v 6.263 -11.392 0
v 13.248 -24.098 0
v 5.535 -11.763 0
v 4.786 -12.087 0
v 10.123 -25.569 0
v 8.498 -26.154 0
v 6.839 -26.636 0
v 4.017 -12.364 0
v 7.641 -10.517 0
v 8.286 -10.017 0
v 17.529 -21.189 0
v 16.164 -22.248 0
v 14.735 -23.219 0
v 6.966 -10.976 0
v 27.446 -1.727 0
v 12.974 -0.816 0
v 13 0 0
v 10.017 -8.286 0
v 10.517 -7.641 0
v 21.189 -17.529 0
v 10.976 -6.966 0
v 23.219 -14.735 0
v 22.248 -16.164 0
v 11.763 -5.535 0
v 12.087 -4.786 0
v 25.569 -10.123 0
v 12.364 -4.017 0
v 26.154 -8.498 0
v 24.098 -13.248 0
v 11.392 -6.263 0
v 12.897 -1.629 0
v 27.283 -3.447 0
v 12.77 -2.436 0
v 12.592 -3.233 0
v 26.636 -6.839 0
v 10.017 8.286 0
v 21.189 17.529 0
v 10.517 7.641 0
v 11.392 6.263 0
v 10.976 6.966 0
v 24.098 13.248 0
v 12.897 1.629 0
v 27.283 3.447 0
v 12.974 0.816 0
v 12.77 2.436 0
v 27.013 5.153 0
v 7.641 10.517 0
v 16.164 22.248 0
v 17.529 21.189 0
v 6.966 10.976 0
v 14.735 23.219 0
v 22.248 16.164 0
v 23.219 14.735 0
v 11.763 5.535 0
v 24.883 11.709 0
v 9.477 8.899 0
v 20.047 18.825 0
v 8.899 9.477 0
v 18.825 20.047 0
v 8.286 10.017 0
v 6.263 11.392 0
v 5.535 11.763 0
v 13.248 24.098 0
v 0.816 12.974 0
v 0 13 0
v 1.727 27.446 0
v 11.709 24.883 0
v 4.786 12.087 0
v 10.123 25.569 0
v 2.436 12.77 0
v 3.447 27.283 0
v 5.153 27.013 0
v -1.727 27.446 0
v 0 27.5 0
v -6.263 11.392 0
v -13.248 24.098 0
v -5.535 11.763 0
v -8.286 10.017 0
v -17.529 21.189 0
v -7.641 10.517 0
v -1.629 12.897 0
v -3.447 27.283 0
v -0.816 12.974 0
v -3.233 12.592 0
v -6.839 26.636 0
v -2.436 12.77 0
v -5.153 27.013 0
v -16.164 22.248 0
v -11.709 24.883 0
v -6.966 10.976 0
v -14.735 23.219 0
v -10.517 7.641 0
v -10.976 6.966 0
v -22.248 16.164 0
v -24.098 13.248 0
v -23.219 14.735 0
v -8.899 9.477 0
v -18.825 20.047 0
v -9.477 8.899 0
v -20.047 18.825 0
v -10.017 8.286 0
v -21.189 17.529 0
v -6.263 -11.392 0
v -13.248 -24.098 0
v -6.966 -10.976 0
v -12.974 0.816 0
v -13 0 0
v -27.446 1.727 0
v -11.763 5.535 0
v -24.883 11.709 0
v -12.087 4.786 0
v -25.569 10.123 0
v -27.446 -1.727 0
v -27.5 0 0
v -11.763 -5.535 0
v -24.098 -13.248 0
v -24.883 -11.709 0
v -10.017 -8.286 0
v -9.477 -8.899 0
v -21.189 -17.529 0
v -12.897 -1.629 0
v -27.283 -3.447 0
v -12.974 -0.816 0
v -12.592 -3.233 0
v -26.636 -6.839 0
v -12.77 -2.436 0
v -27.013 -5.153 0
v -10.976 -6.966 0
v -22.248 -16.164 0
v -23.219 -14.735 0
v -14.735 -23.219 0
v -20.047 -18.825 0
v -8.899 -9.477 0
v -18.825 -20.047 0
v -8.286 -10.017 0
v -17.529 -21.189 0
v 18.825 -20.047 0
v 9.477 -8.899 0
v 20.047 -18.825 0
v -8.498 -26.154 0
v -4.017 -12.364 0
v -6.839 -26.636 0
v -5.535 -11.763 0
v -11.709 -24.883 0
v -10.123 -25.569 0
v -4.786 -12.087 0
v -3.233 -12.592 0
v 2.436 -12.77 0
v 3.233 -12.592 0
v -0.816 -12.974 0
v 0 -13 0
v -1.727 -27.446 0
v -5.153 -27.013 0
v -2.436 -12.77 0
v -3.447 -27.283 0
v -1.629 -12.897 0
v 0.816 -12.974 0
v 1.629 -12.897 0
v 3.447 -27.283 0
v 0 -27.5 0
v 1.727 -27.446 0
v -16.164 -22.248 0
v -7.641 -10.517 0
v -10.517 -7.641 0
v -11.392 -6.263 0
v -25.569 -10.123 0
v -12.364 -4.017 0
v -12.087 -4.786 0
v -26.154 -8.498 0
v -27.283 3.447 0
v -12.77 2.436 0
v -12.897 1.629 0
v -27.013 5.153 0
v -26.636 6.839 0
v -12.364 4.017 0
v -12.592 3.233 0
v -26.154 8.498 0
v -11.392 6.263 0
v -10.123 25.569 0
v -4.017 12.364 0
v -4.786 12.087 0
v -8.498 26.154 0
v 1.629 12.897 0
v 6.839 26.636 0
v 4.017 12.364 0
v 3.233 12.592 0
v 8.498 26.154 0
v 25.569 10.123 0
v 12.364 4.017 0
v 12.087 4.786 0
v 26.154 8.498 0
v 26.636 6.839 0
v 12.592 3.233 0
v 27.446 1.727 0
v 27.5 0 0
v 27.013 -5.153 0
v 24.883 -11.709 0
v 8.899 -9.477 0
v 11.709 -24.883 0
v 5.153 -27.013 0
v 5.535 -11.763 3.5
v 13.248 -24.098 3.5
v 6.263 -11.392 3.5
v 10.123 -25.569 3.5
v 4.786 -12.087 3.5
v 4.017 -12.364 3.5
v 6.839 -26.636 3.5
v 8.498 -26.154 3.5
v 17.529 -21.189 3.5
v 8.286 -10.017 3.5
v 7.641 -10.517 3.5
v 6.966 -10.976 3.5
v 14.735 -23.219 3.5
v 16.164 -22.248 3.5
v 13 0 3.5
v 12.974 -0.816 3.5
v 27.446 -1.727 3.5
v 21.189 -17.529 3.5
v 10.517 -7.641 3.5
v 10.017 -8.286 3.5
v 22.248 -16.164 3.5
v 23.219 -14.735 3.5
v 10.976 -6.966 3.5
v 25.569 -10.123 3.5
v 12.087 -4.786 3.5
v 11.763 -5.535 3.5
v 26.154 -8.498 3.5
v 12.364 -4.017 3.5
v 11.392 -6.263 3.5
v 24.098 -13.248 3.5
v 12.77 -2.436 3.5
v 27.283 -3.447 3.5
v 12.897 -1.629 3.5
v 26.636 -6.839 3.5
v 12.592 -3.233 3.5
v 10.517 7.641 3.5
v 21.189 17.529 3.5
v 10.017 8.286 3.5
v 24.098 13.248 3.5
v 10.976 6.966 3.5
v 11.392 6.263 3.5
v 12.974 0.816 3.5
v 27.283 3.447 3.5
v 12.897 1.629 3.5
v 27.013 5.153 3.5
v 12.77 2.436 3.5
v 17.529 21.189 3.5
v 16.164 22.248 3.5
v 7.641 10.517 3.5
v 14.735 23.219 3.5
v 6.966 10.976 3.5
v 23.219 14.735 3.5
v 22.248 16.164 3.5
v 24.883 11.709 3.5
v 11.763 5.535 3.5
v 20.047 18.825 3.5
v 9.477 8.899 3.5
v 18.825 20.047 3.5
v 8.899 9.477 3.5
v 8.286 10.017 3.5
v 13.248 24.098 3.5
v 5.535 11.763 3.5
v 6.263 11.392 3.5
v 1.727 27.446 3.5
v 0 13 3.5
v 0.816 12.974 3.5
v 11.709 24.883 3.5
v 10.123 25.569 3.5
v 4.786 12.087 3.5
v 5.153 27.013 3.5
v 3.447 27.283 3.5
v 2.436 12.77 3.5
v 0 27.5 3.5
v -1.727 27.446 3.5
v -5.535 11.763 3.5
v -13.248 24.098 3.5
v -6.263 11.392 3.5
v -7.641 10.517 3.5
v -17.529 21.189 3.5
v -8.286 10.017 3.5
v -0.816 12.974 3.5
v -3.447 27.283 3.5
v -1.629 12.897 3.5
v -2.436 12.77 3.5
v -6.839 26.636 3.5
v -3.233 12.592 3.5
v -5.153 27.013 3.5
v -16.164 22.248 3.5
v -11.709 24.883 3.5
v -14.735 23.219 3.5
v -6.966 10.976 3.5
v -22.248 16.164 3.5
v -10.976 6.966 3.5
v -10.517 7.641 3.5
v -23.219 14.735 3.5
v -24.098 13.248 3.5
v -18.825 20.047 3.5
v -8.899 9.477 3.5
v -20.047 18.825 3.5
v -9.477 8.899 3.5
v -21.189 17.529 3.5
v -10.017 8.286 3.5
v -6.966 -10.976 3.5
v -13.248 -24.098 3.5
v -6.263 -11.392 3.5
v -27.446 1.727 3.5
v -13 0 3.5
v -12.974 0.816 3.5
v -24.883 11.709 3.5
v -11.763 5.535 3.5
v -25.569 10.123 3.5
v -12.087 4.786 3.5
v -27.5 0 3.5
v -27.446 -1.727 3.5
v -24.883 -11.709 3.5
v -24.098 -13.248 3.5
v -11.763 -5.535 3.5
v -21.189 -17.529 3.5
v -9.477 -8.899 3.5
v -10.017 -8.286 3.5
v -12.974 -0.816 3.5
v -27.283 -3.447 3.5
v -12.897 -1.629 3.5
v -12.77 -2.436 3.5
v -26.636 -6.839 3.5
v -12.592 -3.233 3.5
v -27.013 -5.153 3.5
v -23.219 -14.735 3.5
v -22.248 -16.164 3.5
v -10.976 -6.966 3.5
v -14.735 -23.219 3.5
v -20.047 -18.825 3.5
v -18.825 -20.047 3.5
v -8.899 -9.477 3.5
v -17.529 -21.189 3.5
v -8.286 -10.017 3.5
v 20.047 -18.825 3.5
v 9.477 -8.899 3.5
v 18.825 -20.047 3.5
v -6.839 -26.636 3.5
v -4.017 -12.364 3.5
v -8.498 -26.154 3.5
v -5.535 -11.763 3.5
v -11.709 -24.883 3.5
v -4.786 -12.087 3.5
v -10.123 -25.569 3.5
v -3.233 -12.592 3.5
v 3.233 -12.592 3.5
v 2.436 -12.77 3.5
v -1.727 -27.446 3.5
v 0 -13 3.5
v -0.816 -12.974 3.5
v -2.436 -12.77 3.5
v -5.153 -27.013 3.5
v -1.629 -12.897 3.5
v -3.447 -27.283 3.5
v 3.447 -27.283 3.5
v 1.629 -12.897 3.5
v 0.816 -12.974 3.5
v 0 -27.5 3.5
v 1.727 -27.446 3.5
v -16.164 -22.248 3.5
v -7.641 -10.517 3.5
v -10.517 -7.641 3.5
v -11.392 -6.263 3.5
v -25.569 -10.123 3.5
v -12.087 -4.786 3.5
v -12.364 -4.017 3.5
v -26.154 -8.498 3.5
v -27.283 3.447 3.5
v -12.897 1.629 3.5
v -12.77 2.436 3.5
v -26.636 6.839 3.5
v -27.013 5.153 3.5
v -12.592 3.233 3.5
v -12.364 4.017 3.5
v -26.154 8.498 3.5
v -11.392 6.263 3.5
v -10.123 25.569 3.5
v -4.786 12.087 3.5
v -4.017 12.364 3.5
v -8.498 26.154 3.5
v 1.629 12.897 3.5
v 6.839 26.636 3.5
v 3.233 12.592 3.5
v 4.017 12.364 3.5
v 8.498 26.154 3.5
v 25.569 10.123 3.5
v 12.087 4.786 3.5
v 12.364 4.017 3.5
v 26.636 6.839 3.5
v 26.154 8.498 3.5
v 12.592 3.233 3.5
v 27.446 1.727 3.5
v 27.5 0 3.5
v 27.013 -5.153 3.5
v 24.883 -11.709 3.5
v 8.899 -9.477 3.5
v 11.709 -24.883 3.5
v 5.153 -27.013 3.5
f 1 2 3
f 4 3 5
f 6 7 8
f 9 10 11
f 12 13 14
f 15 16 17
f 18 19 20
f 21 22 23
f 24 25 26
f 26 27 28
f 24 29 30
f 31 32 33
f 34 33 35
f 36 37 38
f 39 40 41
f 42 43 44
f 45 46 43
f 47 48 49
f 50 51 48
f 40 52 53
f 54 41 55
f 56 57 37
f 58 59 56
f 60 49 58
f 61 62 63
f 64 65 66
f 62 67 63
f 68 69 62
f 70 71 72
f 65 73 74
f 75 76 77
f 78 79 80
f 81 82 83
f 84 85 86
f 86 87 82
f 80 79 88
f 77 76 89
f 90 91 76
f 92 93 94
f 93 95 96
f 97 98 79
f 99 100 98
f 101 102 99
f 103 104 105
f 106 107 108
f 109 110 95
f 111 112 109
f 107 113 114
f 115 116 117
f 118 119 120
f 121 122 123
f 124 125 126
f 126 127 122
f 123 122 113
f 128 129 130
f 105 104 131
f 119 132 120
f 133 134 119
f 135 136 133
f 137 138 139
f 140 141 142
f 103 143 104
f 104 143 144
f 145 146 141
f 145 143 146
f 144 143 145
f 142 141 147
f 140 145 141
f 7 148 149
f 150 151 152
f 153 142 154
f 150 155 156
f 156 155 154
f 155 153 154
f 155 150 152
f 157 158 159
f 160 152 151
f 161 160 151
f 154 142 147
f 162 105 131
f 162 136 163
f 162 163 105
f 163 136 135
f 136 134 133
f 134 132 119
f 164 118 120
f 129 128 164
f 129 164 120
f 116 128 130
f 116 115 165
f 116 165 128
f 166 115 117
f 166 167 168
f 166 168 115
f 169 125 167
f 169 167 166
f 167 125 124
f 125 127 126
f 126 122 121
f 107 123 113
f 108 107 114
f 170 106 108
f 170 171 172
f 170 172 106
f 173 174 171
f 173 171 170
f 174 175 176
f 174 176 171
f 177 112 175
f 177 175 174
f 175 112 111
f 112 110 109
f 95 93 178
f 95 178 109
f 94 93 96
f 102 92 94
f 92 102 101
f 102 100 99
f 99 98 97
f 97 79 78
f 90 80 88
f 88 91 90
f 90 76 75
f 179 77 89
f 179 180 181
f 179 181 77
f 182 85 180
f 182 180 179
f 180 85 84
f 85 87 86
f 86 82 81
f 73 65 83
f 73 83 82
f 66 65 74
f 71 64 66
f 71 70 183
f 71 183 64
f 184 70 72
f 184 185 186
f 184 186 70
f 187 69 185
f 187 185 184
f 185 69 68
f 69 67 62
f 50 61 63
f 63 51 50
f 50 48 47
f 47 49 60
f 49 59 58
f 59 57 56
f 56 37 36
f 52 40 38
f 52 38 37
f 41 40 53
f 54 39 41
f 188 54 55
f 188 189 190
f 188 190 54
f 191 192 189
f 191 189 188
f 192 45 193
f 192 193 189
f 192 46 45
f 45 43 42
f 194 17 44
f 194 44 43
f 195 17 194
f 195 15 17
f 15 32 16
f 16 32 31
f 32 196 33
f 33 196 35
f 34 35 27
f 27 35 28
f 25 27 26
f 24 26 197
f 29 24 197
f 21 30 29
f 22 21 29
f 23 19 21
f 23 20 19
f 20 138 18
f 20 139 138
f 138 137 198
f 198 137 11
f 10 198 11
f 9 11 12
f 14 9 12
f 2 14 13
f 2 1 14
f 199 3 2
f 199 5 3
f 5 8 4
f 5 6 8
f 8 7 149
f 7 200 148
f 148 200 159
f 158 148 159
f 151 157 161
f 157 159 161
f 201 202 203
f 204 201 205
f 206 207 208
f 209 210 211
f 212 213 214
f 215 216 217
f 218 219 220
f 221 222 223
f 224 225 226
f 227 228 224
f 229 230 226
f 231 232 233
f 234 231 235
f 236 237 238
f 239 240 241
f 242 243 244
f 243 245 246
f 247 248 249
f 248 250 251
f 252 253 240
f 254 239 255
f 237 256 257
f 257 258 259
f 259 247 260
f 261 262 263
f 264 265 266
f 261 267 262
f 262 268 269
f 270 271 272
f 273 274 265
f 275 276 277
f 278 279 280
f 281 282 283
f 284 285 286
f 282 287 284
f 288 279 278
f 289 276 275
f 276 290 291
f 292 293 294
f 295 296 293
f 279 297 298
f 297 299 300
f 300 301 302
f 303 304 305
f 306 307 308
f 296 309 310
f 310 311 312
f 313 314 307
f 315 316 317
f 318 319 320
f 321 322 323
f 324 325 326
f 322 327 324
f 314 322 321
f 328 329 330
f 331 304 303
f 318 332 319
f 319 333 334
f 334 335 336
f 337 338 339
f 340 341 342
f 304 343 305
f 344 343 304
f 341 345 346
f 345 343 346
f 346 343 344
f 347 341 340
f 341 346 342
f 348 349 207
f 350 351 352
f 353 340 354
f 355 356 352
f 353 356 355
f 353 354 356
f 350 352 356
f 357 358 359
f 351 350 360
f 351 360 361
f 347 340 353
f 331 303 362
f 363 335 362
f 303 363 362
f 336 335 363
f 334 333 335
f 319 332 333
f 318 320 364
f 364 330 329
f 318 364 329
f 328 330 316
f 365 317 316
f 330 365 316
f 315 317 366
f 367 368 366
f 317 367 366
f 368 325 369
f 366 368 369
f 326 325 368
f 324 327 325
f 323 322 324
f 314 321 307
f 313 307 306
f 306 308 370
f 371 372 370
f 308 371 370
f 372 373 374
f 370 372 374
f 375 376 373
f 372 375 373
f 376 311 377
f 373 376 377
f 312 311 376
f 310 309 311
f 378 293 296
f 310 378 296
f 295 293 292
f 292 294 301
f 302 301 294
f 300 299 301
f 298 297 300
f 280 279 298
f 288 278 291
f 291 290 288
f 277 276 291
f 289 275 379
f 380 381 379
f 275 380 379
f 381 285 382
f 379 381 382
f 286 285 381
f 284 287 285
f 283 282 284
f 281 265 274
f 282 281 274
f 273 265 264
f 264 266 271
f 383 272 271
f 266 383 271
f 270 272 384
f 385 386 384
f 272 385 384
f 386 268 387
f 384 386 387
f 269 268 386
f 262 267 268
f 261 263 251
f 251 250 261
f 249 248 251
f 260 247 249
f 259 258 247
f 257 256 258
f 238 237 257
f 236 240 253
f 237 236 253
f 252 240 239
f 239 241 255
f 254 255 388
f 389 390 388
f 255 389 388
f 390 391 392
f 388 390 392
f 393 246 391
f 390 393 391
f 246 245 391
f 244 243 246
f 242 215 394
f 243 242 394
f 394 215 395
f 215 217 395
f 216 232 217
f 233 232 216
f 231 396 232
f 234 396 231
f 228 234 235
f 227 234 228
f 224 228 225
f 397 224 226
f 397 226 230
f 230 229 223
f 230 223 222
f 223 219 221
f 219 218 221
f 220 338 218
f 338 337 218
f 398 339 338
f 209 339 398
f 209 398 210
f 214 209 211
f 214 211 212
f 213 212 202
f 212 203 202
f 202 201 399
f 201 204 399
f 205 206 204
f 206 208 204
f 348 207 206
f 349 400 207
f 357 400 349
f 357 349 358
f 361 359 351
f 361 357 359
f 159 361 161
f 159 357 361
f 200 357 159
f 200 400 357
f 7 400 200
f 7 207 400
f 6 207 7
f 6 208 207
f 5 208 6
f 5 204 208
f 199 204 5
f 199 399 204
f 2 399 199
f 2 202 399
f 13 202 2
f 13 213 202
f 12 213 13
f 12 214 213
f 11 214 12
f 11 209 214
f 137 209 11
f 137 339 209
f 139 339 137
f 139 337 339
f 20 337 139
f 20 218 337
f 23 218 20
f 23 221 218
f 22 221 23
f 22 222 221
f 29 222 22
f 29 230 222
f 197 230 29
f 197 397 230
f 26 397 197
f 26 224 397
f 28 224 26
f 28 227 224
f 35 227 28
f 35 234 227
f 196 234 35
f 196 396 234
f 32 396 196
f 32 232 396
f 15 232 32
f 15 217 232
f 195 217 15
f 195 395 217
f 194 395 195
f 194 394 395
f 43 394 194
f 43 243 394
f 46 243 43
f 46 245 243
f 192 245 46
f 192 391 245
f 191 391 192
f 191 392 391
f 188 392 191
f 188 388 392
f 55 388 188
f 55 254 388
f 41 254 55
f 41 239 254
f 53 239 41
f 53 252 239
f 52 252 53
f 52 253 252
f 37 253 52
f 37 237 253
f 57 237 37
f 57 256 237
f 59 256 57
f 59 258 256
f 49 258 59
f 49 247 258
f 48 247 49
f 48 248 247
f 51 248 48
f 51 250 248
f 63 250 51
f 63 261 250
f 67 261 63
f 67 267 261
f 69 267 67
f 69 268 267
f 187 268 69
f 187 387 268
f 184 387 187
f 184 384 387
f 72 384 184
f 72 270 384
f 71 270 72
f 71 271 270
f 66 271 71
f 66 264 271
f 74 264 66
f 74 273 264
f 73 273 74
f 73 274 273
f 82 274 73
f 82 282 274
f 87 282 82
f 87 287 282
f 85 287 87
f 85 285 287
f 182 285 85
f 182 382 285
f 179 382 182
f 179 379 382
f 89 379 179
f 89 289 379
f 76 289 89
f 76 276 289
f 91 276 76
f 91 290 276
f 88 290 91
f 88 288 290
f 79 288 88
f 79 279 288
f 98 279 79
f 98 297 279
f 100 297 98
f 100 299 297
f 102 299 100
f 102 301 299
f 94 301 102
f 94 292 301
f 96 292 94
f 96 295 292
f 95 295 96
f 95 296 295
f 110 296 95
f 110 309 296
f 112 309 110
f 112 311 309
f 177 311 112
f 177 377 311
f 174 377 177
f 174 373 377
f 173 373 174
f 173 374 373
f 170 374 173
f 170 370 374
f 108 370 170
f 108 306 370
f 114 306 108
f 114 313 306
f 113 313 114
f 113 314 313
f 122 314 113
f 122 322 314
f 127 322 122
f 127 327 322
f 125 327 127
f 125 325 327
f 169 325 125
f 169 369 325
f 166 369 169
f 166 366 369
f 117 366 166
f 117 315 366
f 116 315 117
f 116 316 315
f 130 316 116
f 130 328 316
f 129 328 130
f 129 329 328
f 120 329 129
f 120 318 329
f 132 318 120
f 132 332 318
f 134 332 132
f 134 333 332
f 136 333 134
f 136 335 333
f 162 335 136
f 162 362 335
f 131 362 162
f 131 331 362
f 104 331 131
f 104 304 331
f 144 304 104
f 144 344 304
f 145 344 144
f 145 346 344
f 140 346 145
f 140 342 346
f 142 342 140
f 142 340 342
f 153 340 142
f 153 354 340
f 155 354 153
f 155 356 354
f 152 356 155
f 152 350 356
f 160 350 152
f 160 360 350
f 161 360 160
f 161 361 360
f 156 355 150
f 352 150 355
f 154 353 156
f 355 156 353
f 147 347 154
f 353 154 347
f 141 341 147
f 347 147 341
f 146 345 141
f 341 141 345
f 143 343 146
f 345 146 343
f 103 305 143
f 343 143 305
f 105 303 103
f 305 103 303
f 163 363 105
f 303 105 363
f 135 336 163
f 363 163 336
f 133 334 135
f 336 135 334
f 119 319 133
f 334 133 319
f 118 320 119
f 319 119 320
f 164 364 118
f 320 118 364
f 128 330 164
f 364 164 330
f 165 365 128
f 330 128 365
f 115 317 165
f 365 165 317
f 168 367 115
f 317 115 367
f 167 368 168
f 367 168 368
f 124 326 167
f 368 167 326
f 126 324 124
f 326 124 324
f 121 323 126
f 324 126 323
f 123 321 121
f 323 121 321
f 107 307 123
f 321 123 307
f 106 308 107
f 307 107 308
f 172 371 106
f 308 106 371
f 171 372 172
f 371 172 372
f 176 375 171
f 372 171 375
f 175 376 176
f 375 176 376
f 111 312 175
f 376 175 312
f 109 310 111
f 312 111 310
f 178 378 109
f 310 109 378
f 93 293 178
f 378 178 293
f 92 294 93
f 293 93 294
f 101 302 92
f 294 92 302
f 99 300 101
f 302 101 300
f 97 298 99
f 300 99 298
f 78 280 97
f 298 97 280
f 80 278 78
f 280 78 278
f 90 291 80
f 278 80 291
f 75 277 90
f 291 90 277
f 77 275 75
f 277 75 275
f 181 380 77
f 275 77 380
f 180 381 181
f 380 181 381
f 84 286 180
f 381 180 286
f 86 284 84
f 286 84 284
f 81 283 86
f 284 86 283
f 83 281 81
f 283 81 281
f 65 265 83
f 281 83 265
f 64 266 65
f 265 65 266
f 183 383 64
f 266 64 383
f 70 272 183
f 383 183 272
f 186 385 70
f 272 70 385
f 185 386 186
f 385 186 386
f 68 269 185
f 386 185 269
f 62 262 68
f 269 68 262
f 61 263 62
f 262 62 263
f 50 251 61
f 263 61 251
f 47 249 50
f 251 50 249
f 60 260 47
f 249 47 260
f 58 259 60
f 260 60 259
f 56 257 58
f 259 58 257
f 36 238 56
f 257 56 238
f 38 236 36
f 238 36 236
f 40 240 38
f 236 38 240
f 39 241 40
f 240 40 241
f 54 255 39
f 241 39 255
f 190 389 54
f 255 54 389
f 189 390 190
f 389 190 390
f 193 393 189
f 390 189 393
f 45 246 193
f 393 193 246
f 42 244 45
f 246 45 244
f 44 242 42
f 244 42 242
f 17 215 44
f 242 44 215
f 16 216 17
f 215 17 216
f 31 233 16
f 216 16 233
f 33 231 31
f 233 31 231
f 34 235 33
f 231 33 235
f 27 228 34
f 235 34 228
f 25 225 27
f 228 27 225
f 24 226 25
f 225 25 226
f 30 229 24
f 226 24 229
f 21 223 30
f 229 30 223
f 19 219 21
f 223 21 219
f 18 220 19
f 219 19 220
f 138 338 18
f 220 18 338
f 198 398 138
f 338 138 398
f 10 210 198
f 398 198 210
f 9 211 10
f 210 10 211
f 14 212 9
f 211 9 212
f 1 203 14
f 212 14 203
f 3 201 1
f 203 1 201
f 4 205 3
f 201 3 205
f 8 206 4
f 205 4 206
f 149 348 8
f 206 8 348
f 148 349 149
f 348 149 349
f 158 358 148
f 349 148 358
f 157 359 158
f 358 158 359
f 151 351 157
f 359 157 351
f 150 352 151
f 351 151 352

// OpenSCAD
$fn = 100;

// height = 3.5
// outer_diameter = 55
// inner_diameter = 26

linear_extrude(height = 3.5) difference() {
  circle(d = 55);
  circle(d = 26);
}
